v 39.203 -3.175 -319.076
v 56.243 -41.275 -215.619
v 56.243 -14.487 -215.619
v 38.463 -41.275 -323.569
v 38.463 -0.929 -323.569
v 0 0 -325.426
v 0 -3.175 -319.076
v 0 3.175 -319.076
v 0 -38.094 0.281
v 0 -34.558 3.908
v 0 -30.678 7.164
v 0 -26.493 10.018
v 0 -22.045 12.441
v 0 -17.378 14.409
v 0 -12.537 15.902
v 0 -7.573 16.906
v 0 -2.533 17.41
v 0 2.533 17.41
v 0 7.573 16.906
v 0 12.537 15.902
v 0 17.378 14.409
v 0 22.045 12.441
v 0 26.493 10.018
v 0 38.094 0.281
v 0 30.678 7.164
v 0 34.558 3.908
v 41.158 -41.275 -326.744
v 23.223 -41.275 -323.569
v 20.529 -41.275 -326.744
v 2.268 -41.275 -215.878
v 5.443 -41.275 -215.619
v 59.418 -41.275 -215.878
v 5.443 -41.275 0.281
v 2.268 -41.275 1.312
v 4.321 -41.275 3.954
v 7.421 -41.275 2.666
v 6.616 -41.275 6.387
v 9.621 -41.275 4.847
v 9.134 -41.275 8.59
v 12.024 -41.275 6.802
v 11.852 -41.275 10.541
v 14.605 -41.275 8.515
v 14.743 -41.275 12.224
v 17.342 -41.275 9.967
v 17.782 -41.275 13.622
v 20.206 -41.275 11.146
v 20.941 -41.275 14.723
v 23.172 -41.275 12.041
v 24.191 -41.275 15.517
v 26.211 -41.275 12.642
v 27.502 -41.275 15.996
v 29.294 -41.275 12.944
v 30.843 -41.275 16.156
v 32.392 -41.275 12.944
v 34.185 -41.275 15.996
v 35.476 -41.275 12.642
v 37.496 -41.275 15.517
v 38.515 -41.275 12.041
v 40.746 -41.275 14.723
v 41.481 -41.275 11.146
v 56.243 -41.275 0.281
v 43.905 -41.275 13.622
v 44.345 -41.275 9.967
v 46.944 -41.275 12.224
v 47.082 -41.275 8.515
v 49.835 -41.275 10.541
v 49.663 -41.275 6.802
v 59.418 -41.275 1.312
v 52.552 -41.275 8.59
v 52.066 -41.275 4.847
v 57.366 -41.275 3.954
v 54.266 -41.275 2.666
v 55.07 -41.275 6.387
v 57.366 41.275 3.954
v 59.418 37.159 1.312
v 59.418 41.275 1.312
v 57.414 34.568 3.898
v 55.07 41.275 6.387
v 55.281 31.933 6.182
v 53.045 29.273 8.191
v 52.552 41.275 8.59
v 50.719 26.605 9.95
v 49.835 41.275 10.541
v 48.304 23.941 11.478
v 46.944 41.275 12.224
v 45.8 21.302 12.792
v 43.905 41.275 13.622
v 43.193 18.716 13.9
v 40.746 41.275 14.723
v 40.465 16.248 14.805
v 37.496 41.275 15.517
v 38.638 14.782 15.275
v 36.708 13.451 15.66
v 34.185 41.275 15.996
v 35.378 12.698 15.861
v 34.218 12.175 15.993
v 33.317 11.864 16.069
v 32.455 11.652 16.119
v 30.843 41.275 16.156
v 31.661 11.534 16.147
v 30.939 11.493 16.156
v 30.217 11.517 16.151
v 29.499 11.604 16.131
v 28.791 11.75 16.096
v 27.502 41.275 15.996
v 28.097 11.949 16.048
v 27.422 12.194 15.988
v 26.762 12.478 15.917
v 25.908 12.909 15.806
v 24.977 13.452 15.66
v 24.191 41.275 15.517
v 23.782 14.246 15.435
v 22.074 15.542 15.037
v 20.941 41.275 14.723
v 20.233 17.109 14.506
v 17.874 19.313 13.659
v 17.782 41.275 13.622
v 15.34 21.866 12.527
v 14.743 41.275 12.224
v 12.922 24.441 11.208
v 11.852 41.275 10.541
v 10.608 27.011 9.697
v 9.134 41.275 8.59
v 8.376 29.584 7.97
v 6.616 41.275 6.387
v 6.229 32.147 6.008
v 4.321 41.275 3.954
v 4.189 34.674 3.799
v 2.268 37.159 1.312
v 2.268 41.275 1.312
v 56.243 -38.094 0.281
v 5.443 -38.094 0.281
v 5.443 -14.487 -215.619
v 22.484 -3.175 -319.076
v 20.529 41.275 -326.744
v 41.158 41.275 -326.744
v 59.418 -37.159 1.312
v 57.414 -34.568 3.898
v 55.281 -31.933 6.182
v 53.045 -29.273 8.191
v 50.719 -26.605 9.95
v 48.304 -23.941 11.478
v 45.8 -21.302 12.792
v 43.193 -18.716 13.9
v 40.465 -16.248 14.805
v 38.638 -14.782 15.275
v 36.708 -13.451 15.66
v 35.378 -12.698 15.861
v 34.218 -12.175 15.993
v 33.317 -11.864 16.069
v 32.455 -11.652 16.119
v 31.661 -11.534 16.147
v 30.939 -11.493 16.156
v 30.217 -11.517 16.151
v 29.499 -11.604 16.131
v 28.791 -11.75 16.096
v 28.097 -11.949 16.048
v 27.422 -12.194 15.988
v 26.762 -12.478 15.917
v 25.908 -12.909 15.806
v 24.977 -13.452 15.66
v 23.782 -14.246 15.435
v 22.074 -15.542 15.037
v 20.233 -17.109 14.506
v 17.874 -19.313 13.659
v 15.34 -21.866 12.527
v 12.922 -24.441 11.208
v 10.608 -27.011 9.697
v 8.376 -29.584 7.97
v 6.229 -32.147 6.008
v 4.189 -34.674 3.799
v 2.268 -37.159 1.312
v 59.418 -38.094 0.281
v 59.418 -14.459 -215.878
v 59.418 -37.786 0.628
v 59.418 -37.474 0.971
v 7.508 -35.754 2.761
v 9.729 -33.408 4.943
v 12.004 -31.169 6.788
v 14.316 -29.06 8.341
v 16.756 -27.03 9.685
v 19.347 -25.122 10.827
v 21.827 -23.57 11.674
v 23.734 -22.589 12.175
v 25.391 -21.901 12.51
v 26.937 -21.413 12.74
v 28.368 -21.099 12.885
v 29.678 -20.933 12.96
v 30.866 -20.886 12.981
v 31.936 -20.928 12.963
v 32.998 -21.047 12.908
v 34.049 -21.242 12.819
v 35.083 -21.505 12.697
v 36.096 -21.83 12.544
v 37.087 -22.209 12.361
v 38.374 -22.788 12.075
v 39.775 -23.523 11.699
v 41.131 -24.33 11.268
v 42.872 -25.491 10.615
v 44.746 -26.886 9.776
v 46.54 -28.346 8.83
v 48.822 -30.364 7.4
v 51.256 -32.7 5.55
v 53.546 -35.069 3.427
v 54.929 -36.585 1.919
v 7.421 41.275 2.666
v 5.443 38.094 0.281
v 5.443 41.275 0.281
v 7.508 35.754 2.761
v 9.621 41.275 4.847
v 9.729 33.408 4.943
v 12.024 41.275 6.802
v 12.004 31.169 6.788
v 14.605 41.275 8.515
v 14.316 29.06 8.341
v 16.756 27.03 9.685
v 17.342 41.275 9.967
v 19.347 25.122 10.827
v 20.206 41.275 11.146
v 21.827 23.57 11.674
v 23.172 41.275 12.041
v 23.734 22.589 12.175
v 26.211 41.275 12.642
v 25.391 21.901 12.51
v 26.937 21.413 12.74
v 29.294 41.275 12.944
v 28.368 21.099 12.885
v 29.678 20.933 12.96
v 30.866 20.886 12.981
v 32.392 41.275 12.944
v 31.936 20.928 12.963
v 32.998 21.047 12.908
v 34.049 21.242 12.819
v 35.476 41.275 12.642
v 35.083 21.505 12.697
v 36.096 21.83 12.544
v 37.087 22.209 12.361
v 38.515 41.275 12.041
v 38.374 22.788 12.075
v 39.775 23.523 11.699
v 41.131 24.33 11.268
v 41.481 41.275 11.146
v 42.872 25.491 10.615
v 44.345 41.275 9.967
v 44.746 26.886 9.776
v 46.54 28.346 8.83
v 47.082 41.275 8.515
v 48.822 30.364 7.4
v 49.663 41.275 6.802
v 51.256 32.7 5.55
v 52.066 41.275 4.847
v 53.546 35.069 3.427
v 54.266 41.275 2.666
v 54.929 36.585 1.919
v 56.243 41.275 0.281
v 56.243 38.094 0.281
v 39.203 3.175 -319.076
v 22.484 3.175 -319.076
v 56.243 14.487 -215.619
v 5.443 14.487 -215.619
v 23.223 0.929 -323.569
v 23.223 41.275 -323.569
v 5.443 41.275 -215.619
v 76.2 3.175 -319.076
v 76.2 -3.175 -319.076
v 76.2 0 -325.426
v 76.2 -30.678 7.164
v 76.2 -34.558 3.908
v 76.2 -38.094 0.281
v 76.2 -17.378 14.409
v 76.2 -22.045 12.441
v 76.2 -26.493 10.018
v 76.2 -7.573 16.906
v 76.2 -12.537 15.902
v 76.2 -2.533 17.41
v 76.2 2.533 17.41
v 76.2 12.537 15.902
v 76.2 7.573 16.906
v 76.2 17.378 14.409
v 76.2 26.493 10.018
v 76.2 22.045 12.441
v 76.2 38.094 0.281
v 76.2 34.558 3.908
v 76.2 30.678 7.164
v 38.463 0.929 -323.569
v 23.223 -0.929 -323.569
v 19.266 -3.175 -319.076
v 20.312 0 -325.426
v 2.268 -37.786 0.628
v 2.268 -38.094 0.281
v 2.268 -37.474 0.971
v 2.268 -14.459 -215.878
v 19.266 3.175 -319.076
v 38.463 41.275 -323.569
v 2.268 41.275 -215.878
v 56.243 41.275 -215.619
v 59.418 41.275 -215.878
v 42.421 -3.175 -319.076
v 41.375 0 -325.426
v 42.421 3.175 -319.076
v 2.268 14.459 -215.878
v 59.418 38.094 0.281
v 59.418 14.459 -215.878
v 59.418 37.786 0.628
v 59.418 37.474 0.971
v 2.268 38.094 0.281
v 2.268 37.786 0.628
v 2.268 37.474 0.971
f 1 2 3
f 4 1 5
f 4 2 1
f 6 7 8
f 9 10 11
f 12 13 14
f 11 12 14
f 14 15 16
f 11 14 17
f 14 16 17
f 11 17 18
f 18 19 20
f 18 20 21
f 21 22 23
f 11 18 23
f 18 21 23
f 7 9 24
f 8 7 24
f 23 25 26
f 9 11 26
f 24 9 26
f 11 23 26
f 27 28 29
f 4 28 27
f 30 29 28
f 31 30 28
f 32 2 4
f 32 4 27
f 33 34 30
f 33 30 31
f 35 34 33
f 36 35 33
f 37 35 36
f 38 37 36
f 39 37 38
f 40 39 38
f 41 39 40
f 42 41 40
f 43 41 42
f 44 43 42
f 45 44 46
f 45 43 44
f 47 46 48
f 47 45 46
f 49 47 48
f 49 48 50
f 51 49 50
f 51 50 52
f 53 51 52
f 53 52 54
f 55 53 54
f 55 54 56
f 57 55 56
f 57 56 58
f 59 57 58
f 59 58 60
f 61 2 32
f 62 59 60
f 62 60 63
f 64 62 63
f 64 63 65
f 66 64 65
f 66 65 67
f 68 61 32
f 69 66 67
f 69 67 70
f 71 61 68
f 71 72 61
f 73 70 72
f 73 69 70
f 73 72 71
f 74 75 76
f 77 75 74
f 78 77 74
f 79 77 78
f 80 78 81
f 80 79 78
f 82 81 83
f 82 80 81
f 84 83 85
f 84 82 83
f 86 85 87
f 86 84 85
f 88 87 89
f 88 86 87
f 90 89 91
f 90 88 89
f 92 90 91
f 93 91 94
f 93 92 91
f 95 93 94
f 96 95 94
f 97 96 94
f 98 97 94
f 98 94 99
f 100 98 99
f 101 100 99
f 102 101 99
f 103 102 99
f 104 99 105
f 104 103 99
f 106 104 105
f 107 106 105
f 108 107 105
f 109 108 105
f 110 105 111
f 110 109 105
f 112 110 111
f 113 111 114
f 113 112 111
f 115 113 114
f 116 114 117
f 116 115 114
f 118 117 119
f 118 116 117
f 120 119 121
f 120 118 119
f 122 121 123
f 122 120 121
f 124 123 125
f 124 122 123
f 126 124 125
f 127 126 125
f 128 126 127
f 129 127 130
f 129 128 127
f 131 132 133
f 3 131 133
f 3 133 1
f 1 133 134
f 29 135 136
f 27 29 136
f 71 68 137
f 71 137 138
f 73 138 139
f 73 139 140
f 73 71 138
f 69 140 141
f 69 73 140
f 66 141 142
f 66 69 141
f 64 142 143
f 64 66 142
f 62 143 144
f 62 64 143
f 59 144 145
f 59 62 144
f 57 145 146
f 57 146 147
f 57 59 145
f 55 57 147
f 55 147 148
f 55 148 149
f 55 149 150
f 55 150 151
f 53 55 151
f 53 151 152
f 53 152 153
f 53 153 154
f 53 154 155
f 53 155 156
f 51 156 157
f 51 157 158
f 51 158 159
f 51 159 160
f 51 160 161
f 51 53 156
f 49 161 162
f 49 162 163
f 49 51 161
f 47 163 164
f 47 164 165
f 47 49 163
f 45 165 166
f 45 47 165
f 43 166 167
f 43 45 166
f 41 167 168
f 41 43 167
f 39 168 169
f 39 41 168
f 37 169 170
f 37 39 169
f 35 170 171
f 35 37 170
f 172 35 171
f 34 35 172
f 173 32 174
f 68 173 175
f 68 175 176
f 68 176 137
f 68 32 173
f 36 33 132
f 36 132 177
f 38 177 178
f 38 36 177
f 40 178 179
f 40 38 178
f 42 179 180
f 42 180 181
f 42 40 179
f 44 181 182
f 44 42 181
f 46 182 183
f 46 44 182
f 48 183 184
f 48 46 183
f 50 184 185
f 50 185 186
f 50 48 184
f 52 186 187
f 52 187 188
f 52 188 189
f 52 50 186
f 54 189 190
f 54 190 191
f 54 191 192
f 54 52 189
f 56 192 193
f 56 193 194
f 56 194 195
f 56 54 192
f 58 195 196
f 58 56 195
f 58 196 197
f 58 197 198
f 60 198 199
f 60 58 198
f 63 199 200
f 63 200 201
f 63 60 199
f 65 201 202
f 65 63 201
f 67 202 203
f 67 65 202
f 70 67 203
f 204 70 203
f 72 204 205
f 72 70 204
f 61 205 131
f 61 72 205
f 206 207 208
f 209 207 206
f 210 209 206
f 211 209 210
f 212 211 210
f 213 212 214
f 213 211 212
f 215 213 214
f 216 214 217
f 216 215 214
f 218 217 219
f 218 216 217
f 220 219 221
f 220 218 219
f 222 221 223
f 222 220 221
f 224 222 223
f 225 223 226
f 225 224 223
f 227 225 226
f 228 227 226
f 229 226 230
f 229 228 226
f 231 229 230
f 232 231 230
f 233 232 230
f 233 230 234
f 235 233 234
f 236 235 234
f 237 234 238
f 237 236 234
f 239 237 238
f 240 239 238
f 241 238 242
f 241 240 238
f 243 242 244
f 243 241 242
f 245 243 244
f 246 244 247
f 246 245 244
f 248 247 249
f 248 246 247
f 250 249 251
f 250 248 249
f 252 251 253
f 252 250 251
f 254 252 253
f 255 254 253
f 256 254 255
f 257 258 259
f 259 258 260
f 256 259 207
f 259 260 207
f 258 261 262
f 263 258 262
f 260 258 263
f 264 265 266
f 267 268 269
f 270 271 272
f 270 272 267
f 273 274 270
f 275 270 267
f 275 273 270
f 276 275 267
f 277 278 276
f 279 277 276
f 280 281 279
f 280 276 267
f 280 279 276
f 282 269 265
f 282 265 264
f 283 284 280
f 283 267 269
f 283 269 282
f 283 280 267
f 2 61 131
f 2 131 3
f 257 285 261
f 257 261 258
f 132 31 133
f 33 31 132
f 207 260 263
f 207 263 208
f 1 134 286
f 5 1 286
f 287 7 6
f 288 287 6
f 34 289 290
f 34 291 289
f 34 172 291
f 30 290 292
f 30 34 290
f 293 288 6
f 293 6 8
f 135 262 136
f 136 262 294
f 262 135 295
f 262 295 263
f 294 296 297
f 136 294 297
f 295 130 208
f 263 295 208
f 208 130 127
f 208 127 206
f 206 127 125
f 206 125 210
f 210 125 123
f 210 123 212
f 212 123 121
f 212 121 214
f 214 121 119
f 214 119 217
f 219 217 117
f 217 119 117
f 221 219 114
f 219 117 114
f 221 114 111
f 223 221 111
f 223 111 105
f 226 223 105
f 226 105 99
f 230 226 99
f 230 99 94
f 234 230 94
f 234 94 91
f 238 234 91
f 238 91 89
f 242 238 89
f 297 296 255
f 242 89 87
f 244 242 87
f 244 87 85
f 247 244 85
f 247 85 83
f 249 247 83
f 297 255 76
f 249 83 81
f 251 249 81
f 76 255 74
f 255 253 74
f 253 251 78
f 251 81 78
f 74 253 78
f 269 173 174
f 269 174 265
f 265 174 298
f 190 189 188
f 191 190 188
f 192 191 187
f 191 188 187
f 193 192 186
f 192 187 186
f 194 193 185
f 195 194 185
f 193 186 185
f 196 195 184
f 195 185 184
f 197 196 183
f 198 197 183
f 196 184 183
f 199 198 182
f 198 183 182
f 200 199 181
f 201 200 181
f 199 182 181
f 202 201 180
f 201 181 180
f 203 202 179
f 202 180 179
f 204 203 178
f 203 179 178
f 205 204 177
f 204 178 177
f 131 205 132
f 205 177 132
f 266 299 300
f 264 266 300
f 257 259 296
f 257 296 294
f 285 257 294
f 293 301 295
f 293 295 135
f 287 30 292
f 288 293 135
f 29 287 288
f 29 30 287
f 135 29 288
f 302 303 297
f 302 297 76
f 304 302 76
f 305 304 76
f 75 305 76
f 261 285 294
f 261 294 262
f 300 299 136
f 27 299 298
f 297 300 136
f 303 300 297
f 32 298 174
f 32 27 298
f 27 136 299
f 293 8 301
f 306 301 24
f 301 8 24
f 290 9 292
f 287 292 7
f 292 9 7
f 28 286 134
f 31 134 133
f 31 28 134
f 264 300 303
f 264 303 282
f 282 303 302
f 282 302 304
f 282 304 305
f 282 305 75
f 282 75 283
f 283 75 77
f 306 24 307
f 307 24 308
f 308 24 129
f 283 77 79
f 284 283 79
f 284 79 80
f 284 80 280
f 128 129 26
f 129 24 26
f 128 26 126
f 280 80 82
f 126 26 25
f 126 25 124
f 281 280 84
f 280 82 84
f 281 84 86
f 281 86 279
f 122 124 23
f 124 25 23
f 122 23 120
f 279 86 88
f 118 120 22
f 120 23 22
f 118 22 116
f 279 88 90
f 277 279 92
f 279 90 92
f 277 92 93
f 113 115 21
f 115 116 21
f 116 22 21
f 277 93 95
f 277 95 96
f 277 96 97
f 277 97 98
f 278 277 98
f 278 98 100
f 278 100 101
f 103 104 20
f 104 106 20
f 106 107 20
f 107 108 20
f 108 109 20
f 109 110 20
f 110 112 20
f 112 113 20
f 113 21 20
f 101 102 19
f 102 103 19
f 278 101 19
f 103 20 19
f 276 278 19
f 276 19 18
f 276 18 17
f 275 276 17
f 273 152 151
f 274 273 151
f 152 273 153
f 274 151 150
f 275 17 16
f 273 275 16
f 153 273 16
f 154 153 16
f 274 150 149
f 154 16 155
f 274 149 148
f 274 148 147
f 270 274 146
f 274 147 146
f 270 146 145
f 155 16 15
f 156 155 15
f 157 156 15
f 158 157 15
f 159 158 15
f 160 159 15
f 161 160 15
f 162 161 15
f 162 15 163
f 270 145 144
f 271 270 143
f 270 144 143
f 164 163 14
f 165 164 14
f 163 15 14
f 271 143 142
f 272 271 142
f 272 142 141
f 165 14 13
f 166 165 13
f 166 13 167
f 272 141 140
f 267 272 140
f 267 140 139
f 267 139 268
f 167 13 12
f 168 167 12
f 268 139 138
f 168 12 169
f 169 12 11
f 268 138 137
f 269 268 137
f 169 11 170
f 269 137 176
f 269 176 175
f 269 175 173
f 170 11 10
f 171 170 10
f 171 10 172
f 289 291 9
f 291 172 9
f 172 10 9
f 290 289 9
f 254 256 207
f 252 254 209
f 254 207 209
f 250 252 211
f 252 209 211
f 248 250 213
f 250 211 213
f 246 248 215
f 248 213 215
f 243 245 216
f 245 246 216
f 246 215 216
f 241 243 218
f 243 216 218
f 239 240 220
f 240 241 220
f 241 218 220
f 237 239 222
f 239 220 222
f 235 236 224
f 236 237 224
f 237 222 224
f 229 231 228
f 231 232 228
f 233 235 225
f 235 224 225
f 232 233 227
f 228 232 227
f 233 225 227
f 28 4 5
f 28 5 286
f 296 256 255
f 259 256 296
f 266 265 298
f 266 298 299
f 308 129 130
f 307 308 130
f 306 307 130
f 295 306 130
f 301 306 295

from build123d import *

# Parameters (mm, degrees)
F2_DEPTH = 76.2
F3_DEPTH = 41.275


with BuildPart() as f2:
    # F1 (on Right) → F2 (new body)
    with BuildSketch(Plane.YZ):
        Polygon((-38.0939699973, 0.2813866025), (-3.175, -319.0764911919), (0, -325.4264911919), (3.175, -319.0764911919), (38.0939699973, 0.2813866025), align=None)
        with BuildLine():
            ThreePointArc((38.0939699973, 0.2813866025), (0, 17.4735088081), (-38.0939699973, 0.2813866025))
            Line((-38.0939699973, 0.2813866025), (38.0939699973, 0.2813866025))
        make_face()
    extrude(amount=F2_DEPTH)

    # F0 (on Front) → F3 (join, symmetric)
    with BuildSketch(Plane.XZ):
        with BuildLine():
            Line((59.4184325825, -215.8783343432), (59.4184325825, 1.3118497446))
            ThreePointArc((59.4184325825, 1.3118497446), (30.8434325825, 16.1563866025), (2.2684325825, 1.3118497446))
            Line((2.2684325825, 1.3118497446), (2.2684325825, -215.8783343432))
            Line((2.2684325825, -215.8783343432), (20.5285961914, -326.7436133975))
            Line((20.5285961914, -326.7436133975), (41.1582689735, -326.7436133975))
            Line((41.1582689735, -326.7436133975), (59.4184325825, -215.8783343432))
        make_face()
        with BuildLine():
            ThreePointArc((5.4434325825, 0.2813866025), (30.8434325825, 12.9813866025), (56.2434325825, 0.2813866025))
            Line((56.2434325825, 0.2813866025), (56.2434325825, -215.6186133975))
            Line((56.2434325825, -215.6186133975), (38.4634325825, -323.5686133975))
            Line((38.4634325825, -323.5686133975), (23.2234325825, -323.5686133975))
            Line((23.2234325825, -323.5686133975), (5.4434325825, -215.6186133975))
            Line((5.4434325825, -215.6186133975), (5.4434325825, 0.2813866025))
        make_face(mode=Mode.SUBTRACT)
    extrude(amount=F3_DEPTH, both=True)


solid = f2.part
